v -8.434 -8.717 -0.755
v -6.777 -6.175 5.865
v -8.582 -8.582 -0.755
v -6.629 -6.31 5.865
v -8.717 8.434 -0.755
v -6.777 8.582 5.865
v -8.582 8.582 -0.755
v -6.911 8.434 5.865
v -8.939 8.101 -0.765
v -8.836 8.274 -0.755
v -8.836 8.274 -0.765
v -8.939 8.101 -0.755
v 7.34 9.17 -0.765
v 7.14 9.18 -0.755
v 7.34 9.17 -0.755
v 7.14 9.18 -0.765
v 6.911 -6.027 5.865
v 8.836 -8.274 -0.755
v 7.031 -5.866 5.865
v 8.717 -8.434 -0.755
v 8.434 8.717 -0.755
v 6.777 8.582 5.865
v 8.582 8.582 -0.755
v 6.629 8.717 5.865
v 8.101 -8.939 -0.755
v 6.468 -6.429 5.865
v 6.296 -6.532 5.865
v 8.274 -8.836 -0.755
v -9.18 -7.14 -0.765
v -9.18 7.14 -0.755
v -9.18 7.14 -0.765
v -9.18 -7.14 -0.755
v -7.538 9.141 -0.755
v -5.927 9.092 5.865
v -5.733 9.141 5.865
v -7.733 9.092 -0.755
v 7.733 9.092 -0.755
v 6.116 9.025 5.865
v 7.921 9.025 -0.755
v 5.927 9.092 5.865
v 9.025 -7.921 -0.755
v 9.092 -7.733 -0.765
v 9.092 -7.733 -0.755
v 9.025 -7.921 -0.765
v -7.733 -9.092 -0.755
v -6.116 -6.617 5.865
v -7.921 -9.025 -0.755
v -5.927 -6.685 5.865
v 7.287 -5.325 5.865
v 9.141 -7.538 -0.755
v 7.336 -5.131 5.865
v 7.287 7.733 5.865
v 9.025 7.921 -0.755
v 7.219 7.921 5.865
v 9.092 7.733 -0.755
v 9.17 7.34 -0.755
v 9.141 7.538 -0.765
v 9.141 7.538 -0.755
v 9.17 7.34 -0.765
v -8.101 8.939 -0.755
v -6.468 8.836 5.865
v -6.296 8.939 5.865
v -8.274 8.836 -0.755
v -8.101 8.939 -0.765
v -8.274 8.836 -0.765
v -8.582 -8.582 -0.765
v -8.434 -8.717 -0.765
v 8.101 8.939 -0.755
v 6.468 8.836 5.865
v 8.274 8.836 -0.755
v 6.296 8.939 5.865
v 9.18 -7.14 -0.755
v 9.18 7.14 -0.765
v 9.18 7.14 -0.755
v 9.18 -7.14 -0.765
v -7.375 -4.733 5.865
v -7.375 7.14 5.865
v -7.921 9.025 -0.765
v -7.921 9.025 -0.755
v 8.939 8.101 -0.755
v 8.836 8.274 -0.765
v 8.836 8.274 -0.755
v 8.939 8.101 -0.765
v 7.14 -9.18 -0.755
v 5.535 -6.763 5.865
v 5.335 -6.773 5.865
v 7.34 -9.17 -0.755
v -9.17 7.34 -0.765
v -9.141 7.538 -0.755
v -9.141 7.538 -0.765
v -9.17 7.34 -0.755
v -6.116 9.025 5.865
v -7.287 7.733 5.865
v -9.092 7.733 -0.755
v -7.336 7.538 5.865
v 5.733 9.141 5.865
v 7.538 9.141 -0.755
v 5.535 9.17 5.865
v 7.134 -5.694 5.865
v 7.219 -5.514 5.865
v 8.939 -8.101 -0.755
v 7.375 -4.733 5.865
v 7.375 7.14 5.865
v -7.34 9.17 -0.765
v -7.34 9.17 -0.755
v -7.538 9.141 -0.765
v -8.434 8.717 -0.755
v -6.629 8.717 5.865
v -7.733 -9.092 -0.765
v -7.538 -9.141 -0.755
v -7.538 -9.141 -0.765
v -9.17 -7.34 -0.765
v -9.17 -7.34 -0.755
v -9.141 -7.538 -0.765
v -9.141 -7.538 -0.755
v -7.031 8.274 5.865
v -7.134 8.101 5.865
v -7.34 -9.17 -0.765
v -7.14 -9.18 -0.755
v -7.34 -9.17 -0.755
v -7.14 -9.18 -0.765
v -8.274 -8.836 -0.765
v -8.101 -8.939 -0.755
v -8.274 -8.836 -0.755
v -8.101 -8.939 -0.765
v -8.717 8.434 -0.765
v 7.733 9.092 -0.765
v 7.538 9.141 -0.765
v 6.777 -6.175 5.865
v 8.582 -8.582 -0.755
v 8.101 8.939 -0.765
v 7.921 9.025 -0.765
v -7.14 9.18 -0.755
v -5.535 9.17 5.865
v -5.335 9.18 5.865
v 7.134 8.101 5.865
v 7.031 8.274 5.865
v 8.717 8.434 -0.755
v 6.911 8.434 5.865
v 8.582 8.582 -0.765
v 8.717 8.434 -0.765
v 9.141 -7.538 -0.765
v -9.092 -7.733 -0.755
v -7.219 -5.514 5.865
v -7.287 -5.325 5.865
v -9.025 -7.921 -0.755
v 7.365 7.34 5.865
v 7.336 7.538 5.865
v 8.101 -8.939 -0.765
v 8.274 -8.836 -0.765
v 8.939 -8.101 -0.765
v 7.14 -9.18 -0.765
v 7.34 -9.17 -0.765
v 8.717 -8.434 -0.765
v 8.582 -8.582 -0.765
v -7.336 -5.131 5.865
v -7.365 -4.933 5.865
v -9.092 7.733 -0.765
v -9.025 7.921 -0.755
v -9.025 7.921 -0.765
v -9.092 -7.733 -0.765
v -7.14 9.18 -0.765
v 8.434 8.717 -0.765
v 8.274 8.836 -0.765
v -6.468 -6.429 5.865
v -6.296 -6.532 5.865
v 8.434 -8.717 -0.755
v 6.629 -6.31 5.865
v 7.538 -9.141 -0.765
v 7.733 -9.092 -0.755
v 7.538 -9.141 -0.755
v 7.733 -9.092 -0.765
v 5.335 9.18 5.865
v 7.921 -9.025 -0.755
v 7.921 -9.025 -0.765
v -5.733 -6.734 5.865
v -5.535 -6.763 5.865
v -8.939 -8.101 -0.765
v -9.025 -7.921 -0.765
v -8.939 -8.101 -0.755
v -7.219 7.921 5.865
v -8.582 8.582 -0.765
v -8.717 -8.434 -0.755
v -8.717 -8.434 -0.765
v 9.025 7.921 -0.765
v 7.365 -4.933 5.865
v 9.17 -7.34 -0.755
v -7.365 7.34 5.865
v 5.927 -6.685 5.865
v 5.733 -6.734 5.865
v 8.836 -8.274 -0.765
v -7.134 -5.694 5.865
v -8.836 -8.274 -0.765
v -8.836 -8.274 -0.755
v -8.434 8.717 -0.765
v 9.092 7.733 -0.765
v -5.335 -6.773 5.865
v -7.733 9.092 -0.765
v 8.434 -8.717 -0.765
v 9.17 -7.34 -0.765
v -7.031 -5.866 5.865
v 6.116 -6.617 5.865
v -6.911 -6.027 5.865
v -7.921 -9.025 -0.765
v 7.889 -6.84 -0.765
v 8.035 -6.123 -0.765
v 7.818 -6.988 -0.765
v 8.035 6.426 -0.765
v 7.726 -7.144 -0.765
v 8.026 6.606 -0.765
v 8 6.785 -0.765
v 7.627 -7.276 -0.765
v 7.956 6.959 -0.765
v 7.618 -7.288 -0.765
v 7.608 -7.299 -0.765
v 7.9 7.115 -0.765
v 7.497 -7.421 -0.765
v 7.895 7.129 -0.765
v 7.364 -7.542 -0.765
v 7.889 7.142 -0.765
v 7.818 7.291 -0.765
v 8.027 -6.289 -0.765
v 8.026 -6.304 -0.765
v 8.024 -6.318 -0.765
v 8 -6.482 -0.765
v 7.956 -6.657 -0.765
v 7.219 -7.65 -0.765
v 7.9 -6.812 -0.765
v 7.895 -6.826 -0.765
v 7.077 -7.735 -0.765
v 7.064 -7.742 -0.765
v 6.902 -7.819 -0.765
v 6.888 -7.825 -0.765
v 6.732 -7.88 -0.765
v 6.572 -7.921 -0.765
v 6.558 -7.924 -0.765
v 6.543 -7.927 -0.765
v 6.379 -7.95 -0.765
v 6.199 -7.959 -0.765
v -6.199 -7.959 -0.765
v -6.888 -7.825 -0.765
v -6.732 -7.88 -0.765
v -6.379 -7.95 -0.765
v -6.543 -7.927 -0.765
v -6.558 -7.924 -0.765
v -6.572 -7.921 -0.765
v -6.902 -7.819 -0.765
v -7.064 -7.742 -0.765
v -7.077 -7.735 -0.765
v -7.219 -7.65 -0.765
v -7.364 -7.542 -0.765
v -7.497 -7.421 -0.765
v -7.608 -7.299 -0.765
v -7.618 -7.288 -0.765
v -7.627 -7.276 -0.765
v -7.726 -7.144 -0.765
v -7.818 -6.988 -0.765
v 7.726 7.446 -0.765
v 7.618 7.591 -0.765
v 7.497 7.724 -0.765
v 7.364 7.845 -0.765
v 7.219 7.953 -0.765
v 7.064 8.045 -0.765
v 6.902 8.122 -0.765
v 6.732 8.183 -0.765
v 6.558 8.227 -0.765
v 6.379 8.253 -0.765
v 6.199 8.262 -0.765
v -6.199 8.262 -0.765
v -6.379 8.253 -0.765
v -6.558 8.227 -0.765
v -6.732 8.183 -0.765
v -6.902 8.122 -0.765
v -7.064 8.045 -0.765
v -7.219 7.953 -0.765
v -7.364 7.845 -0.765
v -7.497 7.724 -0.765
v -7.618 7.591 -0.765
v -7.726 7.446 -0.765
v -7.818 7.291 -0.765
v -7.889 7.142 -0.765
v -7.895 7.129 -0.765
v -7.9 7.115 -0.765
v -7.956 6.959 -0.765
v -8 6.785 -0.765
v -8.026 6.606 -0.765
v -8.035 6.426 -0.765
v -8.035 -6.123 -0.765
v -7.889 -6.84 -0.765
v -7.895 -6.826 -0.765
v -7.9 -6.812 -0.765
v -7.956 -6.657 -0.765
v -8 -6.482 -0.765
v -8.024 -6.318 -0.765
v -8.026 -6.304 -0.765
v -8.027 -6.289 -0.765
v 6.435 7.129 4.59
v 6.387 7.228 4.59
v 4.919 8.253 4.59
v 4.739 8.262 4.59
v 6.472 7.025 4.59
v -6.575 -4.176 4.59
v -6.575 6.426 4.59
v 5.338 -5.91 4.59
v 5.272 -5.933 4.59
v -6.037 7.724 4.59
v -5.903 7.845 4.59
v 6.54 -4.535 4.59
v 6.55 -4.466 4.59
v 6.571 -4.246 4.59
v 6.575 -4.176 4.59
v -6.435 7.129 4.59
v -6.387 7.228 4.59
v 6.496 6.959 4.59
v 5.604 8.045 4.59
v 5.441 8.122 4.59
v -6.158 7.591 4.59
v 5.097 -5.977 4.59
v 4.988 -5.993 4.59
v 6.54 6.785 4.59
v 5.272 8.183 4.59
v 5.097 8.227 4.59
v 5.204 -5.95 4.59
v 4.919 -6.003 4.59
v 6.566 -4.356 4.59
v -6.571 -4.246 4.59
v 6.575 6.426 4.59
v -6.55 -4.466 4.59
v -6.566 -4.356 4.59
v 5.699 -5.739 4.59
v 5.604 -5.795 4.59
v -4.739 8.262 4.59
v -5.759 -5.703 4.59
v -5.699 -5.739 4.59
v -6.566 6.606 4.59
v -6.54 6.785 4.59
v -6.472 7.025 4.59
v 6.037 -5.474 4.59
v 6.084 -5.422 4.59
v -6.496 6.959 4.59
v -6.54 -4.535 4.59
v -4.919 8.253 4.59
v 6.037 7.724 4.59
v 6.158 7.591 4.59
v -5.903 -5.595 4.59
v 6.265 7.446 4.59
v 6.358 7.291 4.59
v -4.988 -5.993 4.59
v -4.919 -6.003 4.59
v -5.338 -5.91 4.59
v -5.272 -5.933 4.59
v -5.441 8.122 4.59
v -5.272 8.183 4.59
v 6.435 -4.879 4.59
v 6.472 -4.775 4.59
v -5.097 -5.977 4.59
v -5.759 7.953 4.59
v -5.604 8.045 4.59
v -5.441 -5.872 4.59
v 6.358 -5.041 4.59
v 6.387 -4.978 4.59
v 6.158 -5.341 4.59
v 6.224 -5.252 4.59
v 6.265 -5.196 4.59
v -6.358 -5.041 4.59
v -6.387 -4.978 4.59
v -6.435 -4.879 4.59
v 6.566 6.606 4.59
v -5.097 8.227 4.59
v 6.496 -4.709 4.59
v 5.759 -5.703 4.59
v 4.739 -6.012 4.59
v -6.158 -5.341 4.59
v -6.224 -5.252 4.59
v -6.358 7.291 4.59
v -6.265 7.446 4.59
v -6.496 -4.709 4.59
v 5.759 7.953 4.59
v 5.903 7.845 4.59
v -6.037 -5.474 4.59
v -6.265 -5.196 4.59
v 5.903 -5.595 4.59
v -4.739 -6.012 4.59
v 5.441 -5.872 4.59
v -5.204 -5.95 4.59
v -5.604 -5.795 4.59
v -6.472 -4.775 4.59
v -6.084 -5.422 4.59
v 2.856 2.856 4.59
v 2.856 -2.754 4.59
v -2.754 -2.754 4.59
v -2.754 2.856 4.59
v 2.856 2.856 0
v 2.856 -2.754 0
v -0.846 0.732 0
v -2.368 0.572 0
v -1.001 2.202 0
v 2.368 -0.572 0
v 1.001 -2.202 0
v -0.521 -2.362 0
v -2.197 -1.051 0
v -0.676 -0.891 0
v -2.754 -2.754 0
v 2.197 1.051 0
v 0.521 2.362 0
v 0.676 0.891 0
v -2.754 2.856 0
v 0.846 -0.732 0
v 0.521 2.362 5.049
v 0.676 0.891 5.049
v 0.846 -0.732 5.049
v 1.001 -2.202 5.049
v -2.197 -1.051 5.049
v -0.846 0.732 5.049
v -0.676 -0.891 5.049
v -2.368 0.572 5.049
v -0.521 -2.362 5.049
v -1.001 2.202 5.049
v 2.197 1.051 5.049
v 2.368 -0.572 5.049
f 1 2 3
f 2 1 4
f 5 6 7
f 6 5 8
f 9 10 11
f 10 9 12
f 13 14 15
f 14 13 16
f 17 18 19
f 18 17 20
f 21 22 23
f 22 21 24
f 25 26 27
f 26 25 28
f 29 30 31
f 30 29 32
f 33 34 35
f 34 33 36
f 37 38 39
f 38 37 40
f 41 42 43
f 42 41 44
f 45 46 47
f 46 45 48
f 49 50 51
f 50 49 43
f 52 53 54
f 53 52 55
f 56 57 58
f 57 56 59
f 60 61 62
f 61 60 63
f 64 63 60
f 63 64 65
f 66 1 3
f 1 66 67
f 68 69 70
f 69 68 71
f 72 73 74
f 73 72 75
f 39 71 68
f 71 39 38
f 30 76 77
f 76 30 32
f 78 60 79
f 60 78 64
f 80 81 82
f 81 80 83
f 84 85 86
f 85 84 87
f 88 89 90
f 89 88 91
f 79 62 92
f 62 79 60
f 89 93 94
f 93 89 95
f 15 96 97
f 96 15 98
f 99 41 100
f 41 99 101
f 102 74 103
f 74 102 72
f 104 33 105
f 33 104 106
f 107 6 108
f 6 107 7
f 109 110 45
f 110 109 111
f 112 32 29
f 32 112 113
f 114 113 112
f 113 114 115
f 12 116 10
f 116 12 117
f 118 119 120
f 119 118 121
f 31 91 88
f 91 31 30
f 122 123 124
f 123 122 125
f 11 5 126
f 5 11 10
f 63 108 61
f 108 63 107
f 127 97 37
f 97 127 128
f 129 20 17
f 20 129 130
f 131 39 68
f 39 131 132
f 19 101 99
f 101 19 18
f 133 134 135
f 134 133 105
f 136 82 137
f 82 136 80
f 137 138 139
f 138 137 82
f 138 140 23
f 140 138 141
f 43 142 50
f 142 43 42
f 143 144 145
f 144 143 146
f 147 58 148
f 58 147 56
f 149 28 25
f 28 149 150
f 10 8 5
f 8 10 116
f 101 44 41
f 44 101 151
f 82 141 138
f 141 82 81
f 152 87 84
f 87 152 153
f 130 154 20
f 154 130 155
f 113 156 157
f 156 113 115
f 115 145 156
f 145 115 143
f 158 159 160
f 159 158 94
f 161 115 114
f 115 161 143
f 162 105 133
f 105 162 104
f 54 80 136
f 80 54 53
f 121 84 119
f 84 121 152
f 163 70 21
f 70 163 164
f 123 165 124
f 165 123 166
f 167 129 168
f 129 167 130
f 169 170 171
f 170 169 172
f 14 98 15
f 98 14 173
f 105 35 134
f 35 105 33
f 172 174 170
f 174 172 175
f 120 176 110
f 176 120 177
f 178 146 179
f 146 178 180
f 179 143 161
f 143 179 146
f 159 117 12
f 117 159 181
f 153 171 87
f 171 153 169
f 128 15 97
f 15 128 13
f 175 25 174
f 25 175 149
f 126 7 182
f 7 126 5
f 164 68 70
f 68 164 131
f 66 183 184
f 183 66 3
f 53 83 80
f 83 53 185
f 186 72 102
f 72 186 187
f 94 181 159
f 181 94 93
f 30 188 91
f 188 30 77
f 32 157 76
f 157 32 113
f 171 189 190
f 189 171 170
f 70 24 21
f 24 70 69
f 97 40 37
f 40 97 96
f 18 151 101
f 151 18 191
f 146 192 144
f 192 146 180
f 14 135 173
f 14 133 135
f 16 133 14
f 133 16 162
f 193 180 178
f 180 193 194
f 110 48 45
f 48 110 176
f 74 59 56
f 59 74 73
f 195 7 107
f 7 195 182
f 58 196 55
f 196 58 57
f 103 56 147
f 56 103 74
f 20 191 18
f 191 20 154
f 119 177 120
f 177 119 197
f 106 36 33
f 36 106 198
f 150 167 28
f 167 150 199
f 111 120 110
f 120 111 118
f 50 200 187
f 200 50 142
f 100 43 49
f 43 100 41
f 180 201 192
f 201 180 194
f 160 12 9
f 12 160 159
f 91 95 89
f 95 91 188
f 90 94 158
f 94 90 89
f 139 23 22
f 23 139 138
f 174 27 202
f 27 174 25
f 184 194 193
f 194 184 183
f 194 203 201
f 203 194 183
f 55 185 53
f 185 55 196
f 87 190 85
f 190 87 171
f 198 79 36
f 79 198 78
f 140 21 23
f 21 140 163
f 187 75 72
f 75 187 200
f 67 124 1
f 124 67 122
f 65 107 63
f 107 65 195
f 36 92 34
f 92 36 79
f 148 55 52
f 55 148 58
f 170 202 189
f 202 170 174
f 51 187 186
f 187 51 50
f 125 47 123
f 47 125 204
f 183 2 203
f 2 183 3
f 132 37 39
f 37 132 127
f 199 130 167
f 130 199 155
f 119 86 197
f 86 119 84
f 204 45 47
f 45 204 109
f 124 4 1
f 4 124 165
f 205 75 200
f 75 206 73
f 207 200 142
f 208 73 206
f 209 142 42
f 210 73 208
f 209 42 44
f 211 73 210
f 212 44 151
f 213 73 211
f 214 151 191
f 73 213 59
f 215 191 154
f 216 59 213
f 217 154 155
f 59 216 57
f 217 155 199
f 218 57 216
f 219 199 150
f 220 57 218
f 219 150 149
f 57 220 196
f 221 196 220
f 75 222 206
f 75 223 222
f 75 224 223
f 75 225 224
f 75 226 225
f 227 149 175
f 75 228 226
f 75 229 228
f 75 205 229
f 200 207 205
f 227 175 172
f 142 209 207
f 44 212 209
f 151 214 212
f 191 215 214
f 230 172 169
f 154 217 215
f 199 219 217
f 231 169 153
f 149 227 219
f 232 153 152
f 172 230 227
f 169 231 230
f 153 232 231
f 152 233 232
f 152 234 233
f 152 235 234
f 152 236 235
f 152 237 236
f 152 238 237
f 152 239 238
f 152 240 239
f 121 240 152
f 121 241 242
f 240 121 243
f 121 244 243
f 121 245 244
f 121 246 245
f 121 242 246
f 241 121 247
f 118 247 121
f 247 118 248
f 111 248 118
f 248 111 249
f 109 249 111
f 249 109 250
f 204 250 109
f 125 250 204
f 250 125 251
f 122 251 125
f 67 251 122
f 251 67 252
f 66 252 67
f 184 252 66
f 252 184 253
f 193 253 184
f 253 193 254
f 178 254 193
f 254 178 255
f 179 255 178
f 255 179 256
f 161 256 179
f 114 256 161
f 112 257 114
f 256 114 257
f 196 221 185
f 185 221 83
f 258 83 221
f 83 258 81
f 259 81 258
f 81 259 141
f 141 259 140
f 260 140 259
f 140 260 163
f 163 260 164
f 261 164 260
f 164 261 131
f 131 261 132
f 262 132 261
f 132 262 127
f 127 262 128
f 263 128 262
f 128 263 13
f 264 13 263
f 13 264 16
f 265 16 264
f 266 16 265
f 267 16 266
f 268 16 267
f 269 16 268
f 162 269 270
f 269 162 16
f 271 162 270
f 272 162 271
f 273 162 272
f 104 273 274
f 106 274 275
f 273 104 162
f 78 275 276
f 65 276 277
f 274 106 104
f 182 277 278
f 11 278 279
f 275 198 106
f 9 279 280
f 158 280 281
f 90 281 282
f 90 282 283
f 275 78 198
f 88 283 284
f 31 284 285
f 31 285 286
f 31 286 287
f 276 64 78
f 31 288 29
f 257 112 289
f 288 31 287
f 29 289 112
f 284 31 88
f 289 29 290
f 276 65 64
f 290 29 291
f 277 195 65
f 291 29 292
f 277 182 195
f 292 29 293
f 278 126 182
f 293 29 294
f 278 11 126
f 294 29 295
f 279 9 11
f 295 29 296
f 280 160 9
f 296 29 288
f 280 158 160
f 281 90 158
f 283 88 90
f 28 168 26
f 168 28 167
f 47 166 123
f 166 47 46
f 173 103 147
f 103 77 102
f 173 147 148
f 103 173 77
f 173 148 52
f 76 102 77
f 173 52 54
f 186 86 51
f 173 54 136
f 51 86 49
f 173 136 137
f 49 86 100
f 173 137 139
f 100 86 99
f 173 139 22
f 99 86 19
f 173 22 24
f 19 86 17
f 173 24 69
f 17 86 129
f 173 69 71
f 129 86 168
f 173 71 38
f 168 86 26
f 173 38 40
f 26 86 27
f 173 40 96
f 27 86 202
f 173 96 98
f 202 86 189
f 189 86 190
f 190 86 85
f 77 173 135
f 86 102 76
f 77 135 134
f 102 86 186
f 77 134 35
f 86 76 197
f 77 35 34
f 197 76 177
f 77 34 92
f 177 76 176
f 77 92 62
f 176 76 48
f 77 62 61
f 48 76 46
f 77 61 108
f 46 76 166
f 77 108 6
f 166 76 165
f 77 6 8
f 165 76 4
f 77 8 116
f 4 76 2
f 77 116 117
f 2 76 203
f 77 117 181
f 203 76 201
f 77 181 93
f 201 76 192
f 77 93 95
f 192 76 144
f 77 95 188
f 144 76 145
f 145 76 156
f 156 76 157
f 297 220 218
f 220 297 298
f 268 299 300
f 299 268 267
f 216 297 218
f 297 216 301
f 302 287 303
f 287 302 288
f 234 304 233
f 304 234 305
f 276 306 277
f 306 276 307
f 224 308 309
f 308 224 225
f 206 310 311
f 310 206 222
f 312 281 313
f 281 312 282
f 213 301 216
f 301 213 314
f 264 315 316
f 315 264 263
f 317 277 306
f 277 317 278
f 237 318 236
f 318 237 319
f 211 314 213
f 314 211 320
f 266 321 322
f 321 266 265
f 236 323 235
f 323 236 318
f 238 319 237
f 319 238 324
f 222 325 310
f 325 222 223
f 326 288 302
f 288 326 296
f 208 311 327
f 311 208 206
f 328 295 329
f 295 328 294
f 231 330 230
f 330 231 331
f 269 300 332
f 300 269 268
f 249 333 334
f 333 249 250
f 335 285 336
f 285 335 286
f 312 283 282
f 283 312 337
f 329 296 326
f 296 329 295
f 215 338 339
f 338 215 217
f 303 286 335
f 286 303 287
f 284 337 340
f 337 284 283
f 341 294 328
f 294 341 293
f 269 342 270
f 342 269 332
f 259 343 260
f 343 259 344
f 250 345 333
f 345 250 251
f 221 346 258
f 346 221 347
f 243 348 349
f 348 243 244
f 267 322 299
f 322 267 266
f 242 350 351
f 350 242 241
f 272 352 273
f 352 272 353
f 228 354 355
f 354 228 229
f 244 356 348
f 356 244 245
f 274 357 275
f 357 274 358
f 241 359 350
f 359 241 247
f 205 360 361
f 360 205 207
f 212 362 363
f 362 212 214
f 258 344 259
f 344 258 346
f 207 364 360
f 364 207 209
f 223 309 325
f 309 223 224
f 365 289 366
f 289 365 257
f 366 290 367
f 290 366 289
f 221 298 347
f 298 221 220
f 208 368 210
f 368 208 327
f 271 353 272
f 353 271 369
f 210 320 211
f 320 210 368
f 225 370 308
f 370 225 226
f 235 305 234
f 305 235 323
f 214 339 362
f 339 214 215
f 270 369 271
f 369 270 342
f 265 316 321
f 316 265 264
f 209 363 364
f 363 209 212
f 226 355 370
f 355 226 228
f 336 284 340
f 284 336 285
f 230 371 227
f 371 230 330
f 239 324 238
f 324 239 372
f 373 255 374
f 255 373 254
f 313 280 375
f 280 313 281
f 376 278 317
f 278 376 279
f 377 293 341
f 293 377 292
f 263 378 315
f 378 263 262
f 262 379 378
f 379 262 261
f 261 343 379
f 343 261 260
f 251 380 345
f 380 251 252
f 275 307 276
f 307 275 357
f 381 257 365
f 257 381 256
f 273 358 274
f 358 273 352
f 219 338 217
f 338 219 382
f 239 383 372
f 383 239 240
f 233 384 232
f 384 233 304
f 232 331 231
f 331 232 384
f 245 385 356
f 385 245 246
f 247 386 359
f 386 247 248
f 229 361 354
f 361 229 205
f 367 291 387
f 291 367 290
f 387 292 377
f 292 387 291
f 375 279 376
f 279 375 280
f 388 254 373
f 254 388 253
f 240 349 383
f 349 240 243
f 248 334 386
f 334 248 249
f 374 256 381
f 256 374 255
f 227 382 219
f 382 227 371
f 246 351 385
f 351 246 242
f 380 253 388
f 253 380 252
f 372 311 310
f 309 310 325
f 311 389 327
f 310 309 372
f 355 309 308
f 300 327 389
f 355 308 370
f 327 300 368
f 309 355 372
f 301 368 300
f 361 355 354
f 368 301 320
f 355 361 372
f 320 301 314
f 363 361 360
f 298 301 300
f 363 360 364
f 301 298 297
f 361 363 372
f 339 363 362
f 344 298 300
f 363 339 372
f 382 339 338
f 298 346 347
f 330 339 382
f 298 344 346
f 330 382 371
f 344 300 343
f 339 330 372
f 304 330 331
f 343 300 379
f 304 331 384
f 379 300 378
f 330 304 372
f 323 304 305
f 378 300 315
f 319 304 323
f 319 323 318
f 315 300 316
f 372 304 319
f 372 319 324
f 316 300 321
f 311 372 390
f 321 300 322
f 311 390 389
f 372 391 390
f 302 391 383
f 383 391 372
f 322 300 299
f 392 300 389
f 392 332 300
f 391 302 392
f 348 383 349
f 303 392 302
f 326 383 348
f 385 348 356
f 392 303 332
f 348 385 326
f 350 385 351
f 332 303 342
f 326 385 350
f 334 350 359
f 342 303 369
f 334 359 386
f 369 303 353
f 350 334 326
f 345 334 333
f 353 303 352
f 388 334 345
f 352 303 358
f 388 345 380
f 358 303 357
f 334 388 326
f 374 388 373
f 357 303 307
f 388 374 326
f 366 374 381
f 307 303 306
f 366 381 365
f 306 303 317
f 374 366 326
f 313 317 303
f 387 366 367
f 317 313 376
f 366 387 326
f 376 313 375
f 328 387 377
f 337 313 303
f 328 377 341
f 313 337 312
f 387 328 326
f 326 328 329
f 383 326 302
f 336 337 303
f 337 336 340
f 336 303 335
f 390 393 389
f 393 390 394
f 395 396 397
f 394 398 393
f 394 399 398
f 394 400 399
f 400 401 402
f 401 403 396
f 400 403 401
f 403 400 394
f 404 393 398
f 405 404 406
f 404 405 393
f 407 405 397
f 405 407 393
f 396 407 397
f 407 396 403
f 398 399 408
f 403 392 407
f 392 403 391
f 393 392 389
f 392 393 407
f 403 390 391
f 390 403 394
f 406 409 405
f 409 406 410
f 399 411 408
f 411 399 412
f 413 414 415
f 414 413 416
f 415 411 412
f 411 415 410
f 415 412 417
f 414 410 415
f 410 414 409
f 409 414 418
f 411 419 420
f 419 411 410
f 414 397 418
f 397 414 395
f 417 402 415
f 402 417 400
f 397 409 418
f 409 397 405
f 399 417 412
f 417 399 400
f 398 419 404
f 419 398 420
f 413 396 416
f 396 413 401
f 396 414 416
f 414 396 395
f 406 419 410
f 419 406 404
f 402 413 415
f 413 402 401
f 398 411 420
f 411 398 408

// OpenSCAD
// Row 4 decorated Cherry MX key

// dimensions Cherry MX connector
c_corr = .5;                // tolerance
c_horiz = 1.1;              // horizontal bar width
c_vert = 1.0;               // vertical bar width
c_dia = 4;                  // cross width
c_depth = 5;                // connector depth
c_space = 4;                // height of hollow inside
c_inset = 0.75;              // distance connector start to keycap base

// decoration
obj = "emerald.stl";          // decoration object
obj_pos = [0,0.7,2.5];        // decoration offset
factor_em = 1.1;
obj_scale = [0.8*factor_em,1.1*factor_em,1.1*factor_em]; // decoration scale
obj_rot = [3,0,0];          // decoration rotation

// keycap shape
head_tilt = 0;              // rotation of top around x-axis
head_pos = 2.25;            // keycap top y-offset
head_height = 11;           // z-offset of keycap top from the bottom of the keycap
cutoff = 6.5;               // cut keycap here to make room for decoration
                            // must be bigger than c_space + c_corr
key_scale = [1.02,1.02,1.02]; // overall scale

// stuff
$fn = 64;

//triangle
b = 10;
h = 10;
w = 13;

// create basic key shape from dxf frames for base and top
module shape()
{
    hull()
    {
        translate([0,0,-c_inset]) linear_extrude(height=.01) import("base.dxf");
        rotate([head_tilt,0,0]) translate([0,6.75+head_pos,head_height-c_inset]) linear_extrude(height=.01) import("top.dxf");
    }
}

// construct the connector pin
module connector() 
{
    
		rotate([0,0,6]) translate([0,0,c_depth/2-.1]) union()
    {
        cube([c_vert+c_corr,c_dia+c_corr,c_depth+.1], center=true );
        cube([c_dia+c_corr,c_horiz+c_corr,c_depth+.1], center=true );
    }
}

// create the hollow key with decoration
module key()
{
    difference()
    {
        // combine basic key shape with decoration
        union()
        {
            //translate(obj_pos) rotate(obj_rot) scale(obj_scale) import(obj);               

            difference()
            {
                shape();
                rotate([head_tilt,0,0]) translate([0,0,5+cutoff-c_inset]) cube([100,100,10], center=true);
            }
        }

        // subtract scaled basic shape, cut at minimum required height
        difference()
        {
            scale([.9,.9,.9]) translate([0,0,-1]) shape();
            translate([0,0,5+c_space+c_corr]) cube([100,100,10], center=true);
        }
    }
}

// combine key, pin and connector. cleanup below the key
scale(key_scale) difference()
{
    union() 
    { 
        key();

			translate([-2.7,-2.7,0]) cube(size = [(c_dia+1+c_corr),(c_dia+1+c_corr),c_space+c_corr], center = false);

	}
    
	connector();	

	translate([0,0,-50-c_inset]) cube([100,100,100], center=true);
	

}
